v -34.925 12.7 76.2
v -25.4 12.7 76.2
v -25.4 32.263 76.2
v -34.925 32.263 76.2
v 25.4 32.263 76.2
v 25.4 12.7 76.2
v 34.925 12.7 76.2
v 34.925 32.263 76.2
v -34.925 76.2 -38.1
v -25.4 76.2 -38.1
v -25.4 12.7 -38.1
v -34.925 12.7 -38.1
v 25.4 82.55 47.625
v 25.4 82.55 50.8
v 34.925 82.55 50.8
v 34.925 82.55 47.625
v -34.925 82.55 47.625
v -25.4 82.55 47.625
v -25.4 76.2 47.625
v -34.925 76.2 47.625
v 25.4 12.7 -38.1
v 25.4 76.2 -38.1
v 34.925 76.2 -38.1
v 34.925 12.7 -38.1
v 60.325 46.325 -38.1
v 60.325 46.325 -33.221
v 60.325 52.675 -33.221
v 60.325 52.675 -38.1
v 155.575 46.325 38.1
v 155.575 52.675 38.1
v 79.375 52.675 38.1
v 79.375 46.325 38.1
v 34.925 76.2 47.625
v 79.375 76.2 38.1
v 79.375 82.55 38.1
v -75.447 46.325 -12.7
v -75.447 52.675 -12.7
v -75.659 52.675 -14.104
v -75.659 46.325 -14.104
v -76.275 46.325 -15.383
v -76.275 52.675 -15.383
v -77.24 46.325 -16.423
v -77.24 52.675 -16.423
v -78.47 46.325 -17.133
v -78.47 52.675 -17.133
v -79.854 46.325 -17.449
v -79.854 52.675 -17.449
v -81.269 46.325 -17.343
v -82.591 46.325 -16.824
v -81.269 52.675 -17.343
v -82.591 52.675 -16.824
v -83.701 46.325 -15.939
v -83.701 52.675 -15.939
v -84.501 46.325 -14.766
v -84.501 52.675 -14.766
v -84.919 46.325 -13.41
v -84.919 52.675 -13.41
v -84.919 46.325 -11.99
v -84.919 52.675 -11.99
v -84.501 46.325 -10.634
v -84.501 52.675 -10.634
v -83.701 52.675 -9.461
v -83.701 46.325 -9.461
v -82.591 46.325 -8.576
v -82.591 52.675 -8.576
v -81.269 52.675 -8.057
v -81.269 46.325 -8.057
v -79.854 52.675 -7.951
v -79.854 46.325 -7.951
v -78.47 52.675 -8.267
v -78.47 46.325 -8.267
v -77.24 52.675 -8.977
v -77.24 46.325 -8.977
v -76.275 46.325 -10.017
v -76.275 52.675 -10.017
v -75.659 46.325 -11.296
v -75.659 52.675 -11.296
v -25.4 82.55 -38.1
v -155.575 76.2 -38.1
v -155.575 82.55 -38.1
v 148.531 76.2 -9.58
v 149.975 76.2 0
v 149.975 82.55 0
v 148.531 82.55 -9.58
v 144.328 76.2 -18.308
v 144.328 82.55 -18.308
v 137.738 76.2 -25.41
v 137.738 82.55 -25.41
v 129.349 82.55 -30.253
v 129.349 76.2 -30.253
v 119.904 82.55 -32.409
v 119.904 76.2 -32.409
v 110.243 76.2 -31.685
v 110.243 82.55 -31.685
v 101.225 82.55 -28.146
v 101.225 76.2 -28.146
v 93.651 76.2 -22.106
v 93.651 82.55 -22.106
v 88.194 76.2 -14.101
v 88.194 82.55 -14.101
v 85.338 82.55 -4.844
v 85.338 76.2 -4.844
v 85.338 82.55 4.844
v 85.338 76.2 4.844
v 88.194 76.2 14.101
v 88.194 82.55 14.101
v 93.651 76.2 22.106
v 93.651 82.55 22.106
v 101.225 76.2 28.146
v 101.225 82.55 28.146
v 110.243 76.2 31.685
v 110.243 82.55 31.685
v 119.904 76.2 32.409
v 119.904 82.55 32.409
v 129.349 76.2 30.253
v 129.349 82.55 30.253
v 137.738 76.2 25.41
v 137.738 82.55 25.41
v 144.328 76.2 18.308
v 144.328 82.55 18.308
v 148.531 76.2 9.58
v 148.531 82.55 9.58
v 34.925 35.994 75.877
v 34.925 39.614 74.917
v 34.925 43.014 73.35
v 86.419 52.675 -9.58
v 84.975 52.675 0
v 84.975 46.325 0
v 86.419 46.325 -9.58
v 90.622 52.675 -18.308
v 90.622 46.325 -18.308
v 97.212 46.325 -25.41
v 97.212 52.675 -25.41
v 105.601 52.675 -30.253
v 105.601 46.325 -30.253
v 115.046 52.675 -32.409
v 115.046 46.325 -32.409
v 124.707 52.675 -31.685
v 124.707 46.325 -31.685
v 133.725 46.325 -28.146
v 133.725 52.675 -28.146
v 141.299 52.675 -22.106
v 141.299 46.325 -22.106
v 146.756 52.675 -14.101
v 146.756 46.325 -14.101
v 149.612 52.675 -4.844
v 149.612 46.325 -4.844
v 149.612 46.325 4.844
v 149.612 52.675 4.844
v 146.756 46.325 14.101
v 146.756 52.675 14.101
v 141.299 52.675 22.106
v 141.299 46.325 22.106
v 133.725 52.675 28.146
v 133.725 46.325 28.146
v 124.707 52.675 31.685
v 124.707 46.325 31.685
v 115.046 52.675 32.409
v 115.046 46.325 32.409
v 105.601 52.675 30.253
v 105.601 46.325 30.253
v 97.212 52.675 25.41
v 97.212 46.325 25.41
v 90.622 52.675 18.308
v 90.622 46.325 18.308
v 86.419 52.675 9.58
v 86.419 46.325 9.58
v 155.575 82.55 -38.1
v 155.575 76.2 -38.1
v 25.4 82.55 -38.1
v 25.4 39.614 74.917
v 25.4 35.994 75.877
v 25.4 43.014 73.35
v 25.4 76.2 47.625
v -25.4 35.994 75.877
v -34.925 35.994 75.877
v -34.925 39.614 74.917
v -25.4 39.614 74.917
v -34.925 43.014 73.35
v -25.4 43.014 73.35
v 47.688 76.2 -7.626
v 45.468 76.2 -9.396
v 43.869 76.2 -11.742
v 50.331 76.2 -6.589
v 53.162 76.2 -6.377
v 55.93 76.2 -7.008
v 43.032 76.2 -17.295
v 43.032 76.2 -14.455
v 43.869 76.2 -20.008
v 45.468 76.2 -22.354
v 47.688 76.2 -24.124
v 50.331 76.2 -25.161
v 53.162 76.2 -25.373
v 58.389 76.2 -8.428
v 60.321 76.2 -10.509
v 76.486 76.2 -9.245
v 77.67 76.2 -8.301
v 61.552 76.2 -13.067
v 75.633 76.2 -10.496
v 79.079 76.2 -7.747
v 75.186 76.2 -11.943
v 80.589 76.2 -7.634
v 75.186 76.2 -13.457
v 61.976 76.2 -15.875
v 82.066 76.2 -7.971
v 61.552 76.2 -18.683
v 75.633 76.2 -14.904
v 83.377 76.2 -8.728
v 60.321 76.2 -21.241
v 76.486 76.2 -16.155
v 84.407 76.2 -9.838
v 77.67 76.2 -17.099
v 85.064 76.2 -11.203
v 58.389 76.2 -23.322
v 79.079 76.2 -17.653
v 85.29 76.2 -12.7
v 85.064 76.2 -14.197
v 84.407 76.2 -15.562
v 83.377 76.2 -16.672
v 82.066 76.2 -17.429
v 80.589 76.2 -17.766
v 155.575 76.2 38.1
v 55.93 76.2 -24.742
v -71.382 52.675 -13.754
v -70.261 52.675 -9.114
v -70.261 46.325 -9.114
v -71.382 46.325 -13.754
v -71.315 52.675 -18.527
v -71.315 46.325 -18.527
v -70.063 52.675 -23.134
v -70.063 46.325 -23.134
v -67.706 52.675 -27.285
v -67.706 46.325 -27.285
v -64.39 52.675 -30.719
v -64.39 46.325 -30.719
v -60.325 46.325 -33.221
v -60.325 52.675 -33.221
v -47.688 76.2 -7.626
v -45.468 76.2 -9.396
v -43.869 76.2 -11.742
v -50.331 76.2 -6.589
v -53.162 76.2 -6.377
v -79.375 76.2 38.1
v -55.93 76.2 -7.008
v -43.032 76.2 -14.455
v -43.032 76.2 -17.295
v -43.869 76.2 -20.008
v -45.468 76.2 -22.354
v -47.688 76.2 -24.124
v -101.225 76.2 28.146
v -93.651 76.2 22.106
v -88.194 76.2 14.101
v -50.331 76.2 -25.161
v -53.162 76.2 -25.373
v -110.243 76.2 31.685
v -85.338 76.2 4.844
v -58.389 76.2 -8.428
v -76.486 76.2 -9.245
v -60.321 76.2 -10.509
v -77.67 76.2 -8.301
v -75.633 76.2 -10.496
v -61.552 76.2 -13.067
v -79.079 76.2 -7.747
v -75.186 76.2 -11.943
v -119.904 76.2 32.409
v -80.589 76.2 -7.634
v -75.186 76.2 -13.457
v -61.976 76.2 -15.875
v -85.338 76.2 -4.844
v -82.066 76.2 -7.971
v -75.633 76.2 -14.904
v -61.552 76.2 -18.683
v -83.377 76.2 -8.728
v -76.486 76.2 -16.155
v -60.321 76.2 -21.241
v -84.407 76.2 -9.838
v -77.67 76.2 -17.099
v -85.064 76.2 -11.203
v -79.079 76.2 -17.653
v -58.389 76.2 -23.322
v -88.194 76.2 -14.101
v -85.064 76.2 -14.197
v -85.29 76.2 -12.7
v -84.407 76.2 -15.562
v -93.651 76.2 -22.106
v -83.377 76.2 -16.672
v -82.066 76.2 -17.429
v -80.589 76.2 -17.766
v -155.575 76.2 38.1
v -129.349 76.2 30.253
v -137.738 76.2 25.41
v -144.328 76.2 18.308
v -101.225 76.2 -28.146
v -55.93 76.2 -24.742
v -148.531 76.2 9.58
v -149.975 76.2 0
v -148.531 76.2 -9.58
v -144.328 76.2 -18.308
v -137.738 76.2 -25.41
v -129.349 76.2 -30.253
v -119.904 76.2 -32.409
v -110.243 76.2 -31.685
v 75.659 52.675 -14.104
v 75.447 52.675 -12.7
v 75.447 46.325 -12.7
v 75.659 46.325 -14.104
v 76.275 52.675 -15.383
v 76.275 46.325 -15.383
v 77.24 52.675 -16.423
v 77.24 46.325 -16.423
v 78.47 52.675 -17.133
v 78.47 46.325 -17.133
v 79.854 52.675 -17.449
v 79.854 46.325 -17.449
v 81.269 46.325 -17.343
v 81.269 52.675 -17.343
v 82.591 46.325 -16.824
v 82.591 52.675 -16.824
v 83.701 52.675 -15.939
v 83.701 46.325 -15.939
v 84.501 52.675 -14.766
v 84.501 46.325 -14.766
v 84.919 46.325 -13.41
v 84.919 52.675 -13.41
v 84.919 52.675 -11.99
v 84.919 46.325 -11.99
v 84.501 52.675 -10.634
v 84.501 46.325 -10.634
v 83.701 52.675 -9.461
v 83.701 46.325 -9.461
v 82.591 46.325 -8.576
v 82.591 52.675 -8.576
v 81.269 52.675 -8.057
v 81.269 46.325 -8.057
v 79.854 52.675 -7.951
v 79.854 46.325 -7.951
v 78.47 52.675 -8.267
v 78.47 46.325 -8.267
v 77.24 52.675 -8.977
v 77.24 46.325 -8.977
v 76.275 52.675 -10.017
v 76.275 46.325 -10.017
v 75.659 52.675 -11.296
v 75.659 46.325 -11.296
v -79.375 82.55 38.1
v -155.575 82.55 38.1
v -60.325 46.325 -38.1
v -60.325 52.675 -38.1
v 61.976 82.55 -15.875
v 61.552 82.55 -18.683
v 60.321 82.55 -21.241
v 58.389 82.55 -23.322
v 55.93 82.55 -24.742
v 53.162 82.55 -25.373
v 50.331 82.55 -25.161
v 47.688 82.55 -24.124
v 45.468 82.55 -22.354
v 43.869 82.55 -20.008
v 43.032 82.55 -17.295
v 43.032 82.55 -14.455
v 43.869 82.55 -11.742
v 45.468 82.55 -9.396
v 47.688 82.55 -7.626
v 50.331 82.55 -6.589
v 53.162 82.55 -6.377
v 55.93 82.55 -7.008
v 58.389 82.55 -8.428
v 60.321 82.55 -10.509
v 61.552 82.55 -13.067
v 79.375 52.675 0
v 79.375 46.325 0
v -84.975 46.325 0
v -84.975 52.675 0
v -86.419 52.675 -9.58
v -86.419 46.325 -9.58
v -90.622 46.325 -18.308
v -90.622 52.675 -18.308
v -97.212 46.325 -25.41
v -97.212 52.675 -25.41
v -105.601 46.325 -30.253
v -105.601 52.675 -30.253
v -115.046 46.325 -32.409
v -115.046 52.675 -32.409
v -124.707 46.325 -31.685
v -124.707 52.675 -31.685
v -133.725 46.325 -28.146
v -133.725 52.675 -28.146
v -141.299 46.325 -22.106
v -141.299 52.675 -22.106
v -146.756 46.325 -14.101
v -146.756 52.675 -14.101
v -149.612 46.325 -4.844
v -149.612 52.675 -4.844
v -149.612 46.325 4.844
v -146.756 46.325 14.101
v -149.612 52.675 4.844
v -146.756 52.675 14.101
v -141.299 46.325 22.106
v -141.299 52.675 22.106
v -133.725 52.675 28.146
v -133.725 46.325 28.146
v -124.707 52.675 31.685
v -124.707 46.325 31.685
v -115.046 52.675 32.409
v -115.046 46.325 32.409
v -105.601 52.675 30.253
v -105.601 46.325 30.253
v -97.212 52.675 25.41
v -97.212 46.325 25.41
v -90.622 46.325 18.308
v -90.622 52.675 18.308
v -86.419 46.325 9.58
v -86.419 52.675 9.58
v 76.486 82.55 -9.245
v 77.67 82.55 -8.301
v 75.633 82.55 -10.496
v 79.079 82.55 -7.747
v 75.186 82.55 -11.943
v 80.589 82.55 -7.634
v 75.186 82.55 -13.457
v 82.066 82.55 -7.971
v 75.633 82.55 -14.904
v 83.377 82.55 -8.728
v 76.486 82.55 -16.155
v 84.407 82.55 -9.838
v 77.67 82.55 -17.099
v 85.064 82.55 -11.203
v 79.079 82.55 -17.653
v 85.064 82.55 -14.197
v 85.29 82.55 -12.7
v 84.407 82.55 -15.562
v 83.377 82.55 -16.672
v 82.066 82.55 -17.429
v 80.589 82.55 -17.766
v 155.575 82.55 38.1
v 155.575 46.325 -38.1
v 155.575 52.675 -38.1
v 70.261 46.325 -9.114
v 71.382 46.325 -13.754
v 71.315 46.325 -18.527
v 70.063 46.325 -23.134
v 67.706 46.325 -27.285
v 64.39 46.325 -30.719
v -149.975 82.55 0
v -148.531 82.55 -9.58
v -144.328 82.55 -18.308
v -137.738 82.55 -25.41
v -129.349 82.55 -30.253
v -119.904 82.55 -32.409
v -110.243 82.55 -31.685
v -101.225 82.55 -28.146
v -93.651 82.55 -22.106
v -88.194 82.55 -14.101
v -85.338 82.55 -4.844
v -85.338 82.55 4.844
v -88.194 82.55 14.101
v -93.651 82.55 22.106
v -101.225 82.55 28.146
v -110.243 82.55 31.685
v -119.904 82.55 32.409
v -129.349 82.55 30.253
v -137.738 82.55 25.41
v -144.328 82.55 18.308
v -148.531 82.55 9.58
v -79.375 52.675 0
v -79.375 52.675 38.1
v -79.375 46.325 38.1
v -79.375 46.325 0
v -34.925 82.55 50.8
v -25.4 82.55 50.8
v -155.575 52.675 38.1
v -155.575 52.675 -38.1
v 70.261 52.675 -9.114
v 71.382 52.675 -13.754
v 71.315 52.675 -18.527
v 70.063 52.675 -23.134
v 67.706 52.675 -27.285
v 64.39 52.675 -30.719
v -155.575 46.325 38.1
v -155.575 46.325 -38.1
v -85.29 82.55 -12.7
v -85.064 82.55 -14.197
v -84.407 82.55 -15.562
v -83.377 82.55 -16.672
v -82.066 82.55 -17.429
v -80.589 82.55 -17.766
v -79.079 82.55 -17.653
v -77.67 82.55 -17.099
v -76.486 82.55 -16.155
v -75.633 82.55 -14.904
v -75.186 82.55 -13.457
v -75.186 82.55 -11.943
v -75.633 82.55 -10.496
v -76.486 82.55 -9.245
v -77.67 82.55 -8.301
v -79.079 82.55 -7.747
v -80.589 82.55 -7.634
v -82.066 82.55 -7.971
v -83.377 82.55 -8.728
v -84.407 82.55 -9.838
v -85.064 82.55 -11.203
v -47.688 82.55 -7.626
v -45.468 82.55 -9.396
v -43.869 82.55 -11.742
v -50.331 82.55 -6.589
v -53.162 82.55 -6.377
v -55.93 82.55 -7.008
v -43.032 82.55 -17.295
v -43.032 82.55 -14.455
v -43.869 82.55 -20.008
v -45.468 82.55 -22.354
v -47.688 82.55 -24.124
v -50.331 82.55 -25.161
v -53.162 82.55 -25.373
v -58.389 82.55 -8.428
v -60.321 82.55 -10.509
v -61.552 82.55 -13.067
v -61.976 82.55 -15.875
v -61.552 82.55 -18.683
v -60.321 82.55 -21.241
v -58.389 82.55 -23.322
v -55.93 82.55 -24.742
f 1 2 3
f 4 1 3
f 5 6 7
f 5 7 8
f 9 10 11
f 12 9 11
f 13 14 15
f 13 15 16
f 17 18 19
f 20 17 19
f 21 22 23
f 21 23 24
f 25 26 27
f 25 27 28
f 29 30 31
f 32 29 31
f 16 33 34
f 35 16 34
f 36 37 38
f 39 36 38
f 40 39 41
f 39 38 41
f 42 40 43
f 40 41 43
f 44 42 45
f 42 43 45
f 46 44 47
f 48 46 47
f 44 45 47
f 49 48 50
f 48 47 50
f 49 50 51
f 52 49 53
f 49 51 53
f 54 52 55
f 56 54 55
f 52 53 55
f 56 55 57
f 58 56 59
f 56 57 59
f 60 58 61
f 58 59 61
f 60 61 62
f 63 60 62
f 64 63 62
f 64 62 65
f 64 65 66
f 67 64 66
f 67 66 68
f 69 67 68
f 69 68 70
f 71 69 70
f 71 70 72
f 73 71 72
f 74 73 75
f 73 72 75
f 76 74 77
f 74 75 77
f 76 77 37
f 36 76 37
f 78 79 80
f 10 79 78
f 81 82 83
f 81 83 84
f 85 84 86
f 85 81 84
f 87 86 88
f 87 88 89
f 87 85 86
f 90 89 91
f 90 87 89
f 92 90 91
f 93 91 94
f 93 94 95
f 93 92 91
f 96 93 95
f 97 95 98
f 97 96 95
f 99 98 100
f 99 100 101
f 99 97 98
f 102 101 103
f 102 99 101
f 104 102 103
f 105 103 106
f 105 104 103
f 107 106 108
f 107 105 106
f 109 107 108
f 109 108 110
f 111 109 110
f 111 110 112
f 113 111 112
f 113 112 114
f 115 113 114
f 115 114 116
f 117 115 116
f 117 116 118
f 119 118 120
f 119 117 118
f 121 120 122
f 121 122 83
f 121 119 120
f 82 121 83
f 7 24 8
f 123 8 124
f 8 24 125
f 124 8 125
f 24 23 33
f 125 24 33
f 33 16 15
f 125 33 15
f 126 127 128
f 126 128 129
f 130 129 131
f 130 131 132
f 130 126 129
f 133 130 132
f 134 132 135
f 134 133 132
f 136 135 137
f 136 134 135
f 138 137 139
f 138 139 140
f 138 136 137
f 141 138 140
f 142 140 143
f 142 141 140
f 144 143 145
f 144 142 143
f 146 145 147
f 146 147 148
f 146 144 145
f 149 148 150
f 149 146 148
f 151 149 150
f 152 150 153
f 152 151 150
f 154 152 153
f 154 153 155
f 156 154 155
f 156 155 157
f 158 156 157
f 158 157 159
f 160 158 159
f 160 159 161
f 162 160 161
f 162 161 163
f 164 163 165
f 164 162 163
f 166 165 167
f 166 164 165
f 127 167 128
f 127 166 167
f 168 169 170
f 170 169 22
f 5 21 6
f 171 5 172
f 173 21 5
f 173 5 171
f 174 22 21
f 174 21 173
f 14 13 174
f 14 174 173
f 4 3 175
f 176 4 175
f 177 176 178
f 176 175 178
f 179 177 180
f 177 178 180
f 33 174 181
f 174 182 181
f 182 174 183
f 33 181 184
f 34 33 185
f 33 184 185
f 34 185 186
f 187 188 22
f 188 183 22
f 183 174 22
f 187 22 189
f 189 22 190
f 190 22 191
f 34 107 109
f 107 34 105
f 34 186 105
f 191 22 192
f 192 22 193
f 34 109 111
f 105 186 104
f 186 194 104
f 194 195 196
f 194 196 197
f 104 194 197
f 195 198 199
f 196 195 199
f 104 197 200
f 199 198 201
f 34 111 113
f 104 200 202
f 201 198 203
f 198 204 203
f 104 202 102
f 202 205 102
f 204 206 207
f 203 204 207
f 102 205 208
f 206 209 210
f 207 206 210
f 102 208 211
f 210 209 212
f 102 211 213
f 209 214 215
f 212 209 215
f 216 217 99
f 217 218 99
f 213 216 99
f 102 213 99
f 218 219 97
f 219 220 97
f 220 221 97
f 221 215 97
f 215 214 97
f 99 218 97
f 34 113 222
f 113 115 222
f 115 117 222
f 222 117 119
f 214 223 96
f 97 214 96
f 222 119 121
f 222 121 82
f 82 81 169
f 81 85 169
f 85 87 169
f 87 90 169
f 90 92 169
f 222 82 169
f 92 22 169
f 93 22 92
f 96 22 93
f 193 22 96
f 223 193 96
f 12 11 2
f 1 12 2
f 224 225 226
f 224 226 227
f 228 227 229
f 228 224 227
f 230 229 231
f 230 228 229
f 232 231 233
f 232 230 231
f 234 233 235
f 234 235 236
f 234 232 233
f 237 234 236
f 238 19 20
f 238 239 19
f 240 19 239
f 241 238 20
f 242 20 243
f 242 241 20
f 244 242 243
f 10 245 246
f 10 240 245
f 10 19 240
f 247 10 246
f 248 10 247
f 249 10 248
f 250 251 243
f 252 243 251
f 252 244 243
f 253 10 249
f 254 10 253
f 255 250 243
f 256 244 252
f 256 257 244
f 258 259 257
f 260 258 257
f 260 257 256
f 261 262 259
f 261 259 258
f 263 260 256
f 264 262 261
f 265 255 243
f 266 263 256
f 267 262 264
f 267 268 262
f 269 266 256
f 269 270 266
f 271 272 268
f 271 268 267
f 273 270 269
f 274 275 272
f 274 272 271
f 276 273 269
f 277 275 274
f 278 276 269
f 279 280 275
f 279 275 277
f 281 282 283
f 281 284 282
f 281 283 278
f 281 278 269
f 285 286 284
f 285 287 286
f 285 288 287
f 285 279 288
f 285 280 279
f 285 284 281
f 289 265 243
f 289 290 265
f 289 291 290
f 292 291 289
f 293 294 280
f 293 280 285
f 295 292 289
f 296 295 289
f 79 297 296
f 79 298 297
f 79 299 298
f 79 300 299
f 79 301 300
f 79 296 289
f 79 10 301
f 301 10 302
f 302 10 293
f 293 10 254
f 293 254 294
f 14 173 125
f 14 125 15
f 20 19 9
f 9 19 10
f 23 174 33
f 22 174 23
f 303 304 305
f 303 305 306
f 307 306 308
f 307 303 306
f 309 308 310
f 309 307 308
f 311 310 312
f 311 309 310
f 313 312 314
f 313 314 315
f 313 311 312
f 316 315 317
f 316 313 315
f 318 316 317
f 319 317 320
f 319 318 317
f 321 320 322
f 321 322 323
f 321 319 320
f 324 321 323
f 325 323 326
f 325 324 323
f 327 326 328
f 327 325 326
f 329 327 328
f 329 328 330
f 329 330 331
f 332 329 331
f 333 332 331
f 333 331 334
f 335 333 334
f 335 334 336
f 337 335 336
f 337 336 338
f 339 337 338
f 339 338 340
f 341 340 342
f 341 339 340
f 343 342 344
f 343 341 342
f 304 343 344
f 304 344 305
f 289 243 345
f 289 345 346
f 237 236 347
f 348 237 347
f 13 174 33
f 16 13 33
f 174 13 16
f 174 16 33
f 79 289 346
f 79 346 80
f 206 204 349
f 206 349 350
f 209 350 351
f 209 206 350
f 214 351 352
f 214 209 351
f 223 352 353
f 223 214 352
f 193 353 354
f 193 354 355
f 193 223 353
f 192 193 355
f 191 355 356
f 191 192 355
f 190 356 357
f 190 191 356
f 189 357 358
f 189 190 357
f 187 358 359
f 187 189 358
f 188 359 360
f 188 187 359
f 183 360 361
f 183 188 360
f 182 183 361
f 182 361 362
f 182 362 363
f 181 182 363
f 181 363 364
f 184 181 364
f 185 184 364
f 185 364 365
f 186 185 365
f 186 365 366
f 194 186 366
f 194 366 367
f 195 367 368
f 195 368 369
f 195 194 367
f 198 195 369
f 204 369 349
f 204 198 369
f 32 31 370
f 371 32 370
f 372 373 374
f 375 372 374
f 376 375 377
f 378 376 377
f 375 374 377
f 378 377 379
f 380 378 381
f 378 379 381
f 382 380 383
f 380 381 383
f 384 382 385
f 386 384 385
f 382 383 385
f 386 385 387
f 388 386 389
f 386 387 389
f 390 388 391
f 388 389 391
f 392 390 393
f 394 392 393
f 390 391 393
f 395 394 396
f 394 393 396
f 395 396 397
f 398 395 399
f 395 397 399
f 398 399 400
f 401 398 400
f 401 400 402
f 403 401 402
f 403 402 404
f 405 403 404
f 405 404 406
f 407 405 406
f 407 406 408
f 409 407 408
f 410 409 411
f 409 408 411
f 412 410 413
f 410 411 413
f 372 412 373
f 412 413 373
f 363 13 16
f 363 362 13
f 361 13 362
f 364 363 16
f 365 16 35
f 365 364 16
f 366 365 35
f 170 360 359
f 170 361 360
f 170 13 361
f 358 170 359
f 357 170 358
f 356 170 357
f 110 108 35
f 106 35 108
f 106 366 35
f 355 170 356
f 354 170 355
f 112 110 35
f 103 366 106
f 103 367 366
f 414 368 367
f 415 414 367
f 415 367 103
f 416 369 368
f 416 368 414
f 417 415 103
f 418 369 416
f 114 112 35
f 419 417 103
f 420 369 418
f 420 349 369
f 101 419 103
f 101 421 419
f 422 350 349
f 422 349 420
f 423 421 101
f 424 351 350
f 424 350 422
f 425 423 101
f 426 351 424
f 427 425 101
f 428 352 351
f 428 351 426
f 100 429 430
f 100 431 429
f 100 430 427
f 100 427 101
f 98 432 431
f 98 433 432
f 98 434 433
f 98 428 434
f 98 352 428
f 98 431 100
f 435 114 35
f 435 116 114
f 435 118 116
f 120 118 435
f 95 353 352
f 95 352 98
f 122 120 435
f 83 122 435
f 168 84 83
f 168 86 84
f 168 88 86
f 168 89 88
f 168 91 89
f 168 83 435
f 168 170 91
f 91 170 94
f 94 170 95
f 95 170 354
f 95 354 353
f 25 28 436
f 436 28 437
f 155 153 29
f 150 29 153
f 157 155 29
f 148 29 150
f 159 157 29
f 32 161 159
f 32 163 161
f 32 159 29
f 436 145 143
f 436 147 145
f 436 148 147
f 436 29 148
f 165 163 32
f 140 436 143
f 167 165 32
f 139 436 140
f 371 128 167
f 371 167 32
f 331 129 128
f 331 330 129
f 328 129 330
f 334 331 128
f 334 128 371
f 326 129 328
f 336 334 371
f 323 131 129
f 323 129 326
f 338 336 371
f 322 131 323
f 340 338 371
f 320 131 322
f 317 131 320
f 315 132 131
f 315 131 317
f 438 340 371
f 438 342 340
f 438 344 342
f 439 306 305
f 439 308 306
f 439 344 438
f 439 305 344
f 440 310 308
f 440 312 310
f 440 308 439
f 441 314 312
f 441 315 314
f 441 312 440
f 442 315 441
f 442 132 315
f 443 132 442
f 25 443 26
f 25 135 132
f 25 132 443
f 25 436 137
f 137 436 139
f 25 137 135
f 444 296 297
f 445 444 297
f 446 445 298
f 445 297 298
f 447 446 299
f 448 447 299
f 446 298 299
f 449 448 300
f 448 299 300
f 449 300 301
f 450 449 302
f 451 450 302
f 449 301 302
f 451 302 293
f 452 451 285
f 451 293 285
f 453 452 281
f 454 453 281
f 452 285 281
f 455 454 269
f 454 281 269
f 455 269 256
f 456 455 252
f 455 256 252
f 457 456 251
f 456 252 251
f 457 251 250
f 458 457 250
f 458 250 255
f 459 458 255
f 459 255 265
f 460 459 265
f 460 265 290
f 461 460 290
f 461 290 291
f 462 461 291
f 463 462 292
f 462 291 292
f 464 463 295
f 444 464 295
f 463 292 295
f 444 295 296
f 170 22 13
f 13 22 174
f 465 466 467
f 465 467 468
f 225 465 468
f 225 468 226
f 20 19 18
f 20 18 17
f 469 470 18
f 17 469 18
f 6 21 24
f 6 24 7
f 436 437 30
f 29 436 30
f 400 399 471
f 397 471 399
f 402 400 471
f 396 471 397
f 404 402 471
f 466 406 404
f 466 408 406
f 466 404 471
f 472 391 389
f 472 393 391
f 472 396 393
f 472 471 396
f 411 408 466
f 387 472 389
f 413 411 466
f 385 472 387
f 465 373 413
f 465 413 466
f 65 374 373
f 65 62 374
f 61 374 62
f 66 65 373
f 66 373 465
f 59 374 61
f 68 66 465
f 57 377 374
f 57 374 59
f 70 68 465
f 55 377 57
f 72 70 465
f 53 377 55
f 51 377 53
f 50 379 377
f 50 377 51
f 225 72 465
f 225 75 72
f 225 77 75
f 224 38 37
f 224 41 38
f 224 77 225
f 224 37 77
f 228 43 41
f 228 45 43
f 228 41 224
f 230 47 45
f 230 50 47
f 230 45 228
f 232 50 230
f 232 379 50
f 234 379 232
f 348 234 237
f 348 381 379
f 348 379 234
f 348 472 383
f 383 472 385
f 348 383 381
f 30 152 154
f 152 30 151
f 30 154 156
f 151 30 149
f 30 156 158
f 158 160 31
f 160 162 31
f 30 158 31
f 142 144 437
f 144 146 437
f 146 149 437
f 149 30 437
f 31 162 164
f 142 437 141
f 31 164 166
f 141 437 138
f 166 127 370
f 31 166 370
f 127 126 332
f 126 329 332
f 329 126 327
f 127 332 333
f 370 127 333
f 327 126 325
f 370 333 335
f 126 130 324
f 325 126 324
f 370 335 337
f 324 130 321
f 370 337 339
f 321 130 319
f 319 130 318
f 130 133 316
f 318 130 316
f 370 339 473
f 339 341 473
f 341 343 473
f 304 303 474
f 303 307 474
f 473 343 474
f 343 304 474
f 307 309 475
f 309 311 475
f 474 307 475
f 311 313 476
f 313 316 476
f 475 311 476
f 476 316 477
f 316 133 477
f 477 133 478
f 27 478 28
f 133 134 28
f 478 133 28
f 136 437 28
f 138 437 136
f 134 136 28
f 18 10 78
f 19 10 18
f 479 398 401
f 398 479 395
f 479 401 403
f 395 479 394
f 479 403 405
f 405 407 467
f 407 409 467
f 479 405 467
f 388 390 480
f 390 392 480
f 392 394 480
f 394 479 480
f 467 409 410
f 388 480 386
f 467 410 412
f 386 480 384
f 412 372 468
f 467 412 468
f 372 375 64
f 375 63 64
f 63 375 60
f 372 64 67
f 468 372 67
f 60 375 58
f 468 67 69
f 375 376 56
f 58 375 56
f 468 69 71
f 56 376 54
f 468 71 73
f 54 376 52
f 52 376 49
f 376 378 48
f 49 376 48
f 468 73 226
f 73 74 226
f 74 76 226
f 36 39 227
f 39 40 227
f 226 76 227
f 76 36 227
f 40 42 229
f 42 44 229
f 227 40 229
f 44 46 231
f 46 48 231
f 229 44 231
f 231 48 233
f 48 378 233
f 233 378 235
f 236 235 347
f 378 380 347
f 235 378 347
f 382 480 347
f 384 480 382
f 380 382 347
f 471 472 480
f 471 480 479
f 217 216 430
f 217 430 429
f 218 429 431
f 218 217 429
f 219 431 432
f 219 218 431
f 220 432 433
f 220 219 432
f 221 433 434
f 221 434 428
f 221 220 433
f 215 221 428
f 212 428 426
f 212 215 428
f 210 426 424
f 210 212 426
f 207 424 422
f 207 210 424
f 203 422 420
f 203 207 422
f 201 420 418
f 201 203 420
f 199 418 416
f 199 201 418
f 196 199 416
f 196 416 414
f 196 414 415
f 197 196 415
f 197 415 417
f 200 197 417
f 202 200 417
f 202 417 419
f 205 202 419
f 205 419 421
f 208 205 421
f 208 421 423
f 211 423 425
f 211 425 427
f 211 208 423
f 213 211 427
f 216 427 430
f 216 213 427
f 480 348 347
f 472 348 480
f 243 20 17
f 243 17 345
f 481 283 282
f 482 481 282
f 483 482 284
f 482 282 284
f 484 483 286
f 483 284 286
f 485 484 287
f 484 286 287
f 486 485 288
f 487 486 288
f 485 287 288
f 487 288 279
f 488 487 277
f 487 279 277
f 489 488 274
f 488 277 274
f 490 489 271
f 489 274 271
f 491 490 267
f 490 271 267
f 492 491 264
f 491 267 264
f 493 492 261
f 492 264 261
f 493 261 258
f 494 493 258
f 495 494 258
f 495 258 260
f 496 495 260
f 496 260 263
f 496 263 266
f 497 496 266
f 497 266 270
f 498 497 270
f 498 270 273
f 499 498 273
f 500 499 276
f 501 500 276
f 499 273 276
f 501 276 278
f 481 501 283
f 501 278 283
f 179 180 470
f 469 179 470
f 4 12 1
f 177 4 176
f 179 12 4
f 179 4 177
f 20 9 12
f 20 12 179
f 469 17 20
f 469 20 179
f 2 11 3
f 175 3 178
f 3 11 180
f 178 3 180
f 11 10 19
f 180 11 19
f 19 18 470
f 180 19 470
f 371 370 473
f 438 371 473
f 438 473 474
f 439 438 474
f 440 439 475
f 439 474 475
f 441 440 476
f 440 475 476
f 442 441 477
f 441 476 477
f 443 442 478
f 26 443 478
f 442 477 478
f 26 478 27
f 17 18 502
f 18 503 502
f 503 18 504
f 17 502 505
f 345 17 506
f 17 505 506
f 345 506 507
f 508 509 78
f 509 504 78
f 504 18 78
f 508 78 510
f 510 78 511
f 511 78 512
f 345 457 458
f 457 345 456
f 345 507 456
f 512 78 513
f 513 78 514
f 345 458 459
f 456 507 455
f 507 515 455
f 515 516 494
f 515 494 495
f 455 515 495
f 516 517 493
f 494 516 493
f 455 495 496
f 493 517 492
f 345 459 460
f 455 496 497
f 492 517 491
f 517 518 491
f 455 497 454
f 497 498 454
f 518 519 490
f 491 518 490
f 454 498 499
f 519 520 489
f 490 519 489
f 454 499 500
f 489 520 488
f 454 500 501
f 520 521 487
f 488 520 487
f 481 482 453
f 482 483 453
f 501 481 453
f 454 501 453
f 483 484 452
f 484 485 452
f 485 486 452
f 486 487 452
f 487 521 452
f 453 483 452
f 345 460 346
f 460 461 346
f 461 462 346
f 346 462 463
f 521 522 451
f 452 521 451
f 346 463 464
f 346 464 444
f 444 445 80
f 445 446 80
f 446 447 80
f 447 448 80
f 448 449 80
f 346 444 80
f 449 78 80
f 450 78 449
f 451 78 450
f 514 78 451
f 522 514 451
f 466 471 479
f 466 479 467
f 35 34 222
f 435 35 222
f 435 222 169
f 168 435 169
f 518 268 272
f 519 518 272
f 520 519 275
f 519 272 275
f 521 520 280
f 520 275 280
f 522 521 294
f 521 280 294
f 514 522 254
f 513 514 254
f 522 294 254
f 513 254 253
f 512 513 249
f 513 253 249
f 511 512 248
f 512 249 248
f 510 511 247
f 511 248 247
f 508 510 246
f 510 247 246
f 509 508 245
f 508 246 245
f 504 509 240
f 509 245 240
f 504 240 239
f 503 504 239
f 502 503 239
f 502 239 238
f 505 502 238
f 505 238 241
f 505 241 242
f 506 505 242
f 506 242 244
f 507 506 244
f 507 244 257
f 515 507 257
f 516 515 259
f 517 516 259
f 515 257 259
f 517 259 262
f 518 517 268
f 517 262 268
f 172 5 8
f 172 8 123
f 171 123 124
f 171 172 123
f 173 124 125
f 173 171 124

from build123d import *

# Parameters (mm, degrees)
BOSS_EXTRUDE1_DEPTH = 9.525
SKETCH7_R           = 32.5
SKETCH7_R_2         = 5.08
SKETCH7_R_3         = 9.525
BOSS_EXTRUDE2_DEPTH = 6.35
SKETCH8_R           = 32.5
SKETCH8_R_2         = 4.7625
BOSS_EXTRUDE3_DEPTH = 6.35


with BuildPart() as part:
    # Sketch6 → Boss-Extrude1 (new body)
    with BuildSketch(Plane(origin=(25.4, 0, 0), x_dir=(0, 0, -1), z_dir=(1, 0, 0))):
        with BuildLine():
            Line((-73.349578712, 43.014295617), (-50.8, 82.55))
            Line((-50.8, 82.55), (-47.625, 82.55))
            Line((-47.625, 82.55), (-47.625, 76.2))
            Line((-47.625, 76.2), (38.1, 76.2))
            Line((38.1, 76.2), (38.1, 12.7))
            Line((38.1, 12.7), (-76.2, 12.7))
            Line((-76.2, 12.7), (-76.2, 32.263386753))
            ThreePointArc((-76.2, 32.263386753), (-75.475293164, 37.824567898), (-73.349578712, 43.014295617))
        make_face()
    extrude(amount=BOSS_EXTRUDE1_DEPTH)


with BuildPart() as body_2:
    # Sketch7 → Boss-Extrude2 (new body)
    with BuildSketch(Plane(origin=(0, 76.2, 0), x_dir=(1, 0, 0), z_dir=(0, 1, 0))):
        Polygon((25.4, -47.625), (34.925, -47.625), (79.375, -38.1), (155.575, -38.1), (155.575, 38.1), (25.4, 38.1), align=None)
        with Locations((117.475, 0)):
            Circle(SKETCH7_R, mode=Mode.SUBTRACT)
        with Locations((80.209642092, 12.7)):
            Circle(SKETCH7_R_2, mode=Mode.SUBTRACT)
        with Locations((52.450625989, 15.875)):
            Circle(SKETCH7_R_3, mode=Mode.SUBTRACT)
    extrude(amount=BOSS_EXTRUDE2_DEPTH)


with BuildPart() as body_3:
    # Sketch8 → Boss-Extrude3 (new body)
    with BuildSketch(Plane(origin=(0, 52.675, 0), x_dir=(-1, 0, 0), z_dir=(0, -1, 0))):
        with BuildLine():
            Line((-60.325, 33.221375239), (-60.325, 38.1))
            Line((-60.325, 38.1), (-79.375, 38.1))
            Line((-79.375, 38.1), (-155.575, 38.1))
            Line((-155.575, 38.1), (-155.575, -38.1))
            Line((-155.575, -38.1), (-79.375, -38.1))
            Line((-79.375, -38.1), (-79.375, 0))
            Line((-79.375, 0), (-70.260632831, 9.114367169))
            ThreePointArc((-70.260632831, 9.114367169), (-70.063371785, 23.134041639), (-60.325, 33.221375239))
        make_face()
        with Locations((-117.475, 0)):
            Circle(SKETCH8_R, mode=Mode.SUBTRACT)
        with Locations((-80.209642092, 12.7)):
            Circle(SKETCH8_R_2, mode=Mode.SUBTRACT)
    extrude(amount=BOSS_EXTRUDE3_DEPTH)


with BuildPart() as body_4:
    # Mirror2: mirrored copy
    add(part.part.mirror(Plane(origin=(0, 0, 0), x_dir=(0, 0, 1), z_dir=(1, 0, 0))))


with BuildPart() as body_5:
    # Mirror2 2: mirrored copy
    add(body_2.part.mirror(Plane(origin=(0, 0, 0), x_dir=(0, 0, 1), z_dir=(1, 0, 0))))


with BuildPart() as body_6:
    # Mirror2 3: mirrored copy
    add(body_3.part.mirror(Plane(origin=(0, 0, 0), x_dir=(0, 0, 1), z_dir=(1, 0, 0))))


solid = Compound([part.part, body_2.part, body_3.part, body_4.part, body_5.part, body_6.part])
